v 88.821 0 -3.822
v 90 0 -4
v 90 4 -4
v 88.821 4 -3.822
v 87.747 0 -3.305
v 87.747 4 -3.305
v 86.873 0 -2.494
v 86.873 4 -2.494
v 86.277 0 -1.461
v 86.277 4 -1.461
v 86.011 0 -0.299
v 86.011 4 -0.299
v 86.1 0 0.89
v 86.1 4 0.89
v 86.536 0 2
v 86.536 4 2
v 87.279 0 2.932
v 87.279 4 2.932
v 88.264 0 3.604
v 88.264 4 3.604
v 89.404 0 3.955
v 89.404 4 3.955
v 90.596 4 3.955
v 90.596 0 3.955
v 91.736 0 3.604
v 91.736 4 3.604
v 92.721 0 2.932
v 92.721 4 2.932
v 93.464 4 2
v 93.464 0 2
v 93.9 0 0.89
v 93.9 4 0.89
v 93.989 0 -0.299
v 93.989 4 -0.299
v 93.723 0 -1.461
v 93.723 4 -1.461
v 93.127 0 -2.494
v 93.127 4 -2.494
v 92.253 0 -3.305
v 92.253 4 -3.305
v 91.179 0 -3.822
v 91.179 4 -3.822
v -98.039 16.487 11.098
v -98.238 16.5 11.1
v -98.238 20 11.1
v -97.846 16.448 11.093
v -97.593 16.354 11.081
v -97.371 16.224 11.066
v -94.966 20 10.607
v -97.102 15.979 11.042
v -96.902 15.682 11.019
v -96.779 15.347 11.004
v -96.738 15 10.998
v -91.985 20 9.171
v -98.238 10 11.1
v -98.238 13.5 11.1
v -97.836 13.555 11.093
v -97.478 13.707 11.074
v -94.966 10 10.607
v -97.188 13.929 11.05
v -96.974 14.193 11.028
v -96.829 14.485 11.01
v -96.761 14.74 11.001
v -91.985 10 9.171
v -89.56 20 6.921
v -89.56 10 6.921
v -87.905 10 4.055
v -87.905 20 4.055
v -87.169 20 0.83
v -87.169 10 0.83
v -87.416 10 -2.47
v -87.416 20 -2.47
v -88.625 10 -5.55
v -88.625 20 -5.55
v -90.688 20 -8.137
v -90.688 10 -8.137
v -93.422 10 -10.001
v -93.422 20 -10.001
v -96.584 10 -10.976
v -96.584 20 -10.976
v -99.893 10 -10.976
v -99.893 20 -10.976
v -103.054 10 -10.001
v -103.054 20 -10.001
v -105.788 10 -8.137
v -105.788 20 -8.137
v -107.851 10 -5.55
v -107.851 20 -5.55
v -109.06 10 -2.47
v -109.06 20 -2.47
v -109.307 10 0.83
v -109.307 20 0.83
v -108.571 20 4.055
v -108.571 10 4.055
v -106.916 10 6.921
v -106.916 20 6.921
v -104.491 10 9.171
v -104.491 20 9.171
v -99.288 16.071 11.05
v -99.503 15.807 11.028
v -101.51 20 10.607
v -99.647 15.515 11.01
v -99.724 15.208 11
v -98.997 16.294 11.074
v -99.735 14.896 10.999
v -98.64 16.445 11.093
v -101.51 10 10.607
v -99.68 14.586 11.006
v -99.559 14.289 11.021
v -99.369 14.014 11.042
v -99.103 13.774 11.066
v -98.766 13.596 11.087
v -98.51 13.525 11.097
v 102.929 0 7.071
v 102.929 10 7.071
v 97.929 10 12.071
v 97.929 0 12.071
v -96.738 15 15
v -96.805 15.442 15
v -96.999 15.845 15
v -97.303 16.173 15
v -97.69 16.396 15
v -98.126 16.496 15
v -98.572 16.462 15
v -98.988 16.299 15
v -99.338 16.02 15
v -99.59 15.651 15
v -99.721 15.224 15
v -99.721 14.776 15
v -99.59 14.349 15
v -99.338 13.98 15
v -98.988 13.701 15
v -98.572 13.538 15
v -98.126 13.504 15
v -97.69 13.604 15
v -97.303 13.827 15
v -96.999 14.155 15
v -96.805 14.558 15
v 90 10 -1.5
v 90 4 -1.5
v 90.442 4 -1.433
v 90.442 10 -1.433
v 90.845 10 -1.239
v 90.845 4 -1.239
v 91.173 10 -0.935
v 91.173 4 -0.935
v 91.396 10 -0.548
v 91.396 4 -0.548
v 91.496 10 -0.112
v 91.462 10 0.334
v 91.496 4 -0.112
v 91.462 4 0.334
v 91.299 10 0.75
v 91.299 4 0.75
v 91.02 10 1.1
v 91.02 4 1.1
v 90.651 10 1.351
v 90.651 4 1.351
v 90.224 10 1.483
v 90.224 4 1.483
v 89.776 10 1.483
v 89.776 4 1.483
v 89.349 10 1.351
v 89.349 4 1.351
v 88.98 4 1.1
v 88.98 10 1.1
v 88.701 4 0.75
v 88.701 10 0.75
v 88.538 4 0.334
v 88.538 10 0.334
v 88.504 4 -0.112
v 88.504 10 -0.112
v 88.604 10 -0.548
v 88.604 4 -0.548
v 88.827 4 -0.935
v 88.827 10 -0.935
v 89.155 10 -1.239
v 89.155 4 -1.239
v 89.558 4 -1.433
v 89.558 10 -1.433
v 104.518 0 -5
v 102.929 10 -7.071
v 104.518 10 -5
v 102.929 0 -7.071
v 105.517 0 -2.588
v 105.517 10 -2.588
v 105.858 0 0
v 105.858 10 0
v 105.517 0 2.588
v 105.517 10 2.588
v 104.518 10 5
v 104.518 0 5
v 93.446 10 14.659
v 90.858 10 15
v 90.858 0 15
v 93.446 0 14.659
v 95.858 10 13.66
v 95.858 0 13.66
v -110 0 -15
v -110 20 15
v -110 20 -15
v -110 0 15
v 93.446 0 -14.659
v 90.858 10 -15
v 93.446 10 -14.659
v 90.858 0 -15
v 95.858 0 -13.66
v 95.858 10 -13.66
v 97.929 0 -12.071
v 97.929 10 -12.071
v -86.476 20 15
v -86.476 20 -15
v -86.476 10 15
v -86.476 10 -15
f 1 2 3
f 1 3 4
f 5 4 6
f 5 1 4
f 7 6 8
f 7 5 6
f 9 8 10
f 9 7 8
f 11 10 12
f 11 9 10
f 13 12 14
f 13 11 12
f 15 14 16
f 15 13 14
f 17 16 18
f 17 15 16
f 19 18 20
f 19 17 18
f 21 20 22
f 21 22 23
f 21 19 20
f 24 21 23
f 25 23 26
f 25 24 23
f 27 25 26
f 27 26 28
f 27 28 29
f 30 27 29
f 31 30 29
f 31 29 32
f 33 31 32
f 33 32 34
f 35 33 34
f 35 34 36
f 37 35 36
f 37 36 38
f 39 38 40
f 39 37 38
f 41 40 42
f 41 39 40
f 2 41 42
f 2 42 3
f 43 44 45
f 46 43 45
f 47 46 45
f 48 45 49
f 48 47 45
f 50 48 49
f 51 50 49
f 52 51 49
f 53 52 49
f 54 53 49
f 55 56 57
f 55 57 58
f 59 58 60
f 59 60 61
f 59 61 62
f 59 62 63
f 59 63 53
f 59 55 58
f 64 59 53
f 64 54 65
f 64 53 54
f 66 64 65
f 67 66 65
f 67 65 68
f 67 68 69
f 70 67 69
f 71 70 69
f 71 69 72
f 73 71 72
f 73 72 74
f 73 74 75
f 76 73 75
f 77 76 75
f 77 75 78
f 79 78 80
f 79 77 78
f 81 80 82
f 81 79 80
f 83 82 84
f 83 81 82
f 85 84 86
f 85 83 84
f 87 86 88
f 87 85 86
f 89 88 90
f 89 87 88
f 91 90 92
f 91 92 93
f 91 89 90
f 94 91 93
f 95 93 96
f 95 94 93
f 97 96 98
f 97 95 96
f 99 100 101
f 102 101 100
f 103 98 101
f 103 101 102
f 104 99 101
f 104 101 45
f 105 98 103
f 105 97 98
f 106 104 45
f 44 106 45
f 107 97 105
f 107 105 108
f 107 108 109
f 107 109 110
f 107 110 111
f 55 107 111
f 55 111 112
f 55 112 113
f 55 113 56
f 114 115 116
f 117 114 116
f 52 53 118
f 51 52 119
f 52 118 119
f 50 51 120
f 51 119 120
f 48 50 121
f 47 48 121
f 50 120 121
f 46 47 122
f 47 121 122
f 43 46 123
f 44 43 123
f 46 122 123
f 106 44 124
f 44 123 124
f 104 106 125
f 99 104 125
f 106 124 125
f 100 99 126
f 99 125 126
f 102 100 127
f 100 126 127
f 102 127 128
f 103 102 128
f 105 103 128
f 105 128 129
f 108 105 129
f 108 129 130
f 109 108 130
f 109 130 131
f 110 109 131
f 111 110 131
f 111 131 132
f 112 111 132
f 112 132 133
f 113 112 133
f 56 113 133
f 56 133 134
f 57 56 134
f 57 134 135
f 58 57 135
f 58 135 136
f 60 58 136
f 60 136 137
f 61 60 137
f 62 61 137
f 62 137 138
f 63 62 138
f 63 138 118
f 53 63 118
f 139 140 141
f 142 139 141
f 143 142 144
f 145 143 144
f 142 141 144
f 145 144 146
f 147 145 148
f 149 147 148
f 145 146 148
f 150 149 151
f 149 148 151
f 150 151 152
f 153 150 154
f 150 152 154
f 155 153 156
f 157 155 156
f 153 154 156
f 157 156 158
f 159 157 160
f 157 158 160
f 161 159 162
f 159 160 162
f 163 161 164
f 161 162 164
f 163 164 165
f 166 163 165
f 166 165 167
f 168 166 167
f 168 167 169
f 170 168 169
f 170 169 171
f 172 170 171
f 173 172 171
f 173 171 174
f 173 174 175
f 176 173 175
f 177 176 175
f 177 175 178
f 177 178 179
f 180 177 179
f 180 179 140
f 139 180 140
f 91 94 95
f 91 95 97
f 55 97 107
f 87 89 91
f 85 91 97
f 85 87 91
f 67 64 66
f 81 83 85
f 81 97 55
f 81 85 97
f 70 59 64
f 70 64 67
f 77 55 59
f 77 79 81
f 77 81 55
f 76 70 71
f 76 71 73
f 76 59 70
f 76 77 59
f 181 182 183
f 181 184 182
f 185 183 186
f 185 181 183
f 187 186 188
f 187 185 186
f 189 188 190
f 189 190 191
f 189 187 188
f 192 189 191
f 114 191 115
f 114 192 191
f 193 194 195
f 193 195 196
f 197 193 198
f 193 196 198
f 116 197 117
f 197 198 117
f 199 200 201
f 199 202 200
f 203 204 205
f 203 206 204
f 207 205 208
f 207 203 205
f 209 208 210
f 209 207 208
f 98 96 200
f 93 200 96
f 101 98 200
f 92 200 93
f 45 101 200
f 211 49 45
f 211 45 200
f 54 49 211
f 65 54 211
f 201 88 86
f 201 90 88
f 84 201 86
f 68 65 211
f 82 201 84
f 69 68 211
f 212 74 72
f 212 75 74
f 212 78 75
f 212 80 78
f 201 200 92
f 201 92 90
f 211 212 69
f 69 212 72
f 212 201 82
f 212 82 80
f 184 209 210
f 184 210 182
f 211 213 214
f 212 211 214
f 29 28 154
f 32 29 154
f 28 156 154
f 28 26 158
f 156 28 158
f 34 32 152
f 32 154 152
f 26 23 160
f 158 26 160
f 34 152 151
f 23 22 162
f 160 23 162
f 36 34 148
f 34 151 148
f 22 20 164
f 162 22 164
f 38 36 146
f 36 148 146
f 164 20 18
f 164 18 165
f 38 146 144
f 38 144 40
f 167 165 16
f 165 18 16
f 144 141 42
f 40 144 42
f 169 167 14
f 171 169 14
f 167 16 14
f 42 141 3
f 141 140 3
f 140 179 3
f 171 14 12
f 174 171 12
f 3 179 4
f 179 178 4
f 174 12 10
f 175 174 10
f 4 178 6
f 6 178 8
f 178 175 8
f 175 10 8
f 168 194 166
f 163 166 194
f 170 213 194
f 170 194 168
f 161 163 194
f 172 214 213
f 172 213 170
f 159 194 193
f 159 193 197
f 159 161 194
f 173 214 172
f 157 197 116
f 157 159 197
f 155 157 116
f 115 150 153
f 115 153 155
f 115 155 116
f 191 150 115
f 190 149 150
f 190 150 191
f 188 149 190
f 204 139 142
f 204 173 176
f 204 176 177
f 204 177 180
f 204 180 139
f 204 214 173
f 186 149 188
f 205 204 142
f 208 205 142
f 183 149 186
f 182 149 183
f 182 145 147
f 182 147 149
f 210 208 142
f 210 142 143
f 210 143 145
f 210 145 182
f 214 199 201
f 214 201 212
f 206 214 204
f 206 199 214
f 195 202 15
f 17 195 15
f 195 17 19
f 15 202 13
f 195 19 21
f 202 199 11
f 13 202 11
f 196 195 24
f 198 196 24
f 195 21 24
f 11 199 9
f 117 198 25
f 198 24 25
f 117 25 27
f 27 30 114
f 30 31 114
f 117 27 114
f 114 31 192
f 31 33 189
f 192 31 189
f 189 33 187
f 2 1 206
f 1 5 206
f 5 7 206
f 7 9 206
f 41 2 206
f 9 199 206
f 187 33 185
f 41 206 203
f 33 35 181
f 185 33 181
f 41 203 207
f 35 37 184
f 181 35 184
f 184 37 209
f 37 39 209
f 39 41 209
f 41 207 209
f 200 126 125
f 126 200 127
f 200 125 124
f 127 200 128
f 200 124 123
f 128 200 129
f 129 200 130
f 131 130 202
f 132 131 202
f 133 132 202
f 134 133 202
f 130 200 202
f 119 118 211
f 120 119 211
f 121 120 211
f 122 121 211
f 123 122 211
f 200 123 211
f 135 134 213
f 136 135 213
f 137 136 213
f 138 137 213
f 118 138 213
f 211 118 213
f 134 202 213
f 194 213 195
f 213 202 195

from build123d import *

# Parameters (mm, degrees)
SKETCH1_W           = 220
SKETCH1_H           = 30
BOSS_EXTRUDE1_DEPTH = 10
SKETCH2_W           = 23.523691572
SKETCH2_H           = 30
SKETCH2_R           = 11.1
BOSS_EXTRUDE3_DEPTH = 10
SKETCH6_R           = 1.5
CUT_EXTRUDE2_DEPTH  = 10
CUT_EXTRUDE3_START  = -10
SKETCH4_R           = 4
CUT_EXTRUDE3_DEPTH  = 4
SKETCH7_R           = 1.5
CUT_EXTRUDE4_DEPTH  = 14
CUT_EXTRUDE5_DEPTH  = 10
FILLET1_R           = 10


with BuildPart() as part:
    # Sketch1 → Boss-Extrude1 (new body)
    with BuildSketch(Plane(origin=(0, 0, 0), x_dir=(1, 0, 0), z_dir=(0, 1, 0))):
        Rectangle(SKETCH1_W, SKETCH1_H)
    extrude(amount=BOSS_EXTRUDE1_DEPTH)

    # Sketch2 → Boss-Extrude3 (add)
    with BuildSketch(Plane(origin=(0, 10, 0), x_dir=(1, 0, 0), z_dir=(0, 1, 0))):
        with Locations((-98.238154214, 0)):
            Rectangle(SKETCH2_W, SKETCH2_H)
        with Locations(Location((-98.238154214, 0, 0), (0, 0, 270))):
            Circle(SKETCH2_R, mode=Mode.SUBTRACT)
    extrude(amount=BOSS_EXTRUDE3_DEPTH)

    # Sketch6 → Cut-Extrude2 (cut)
    with BuildSketch(Plane.XY.offset(15)):
        with Locations((-98.238154214, 15)):
            Circle(SKETCH6_R)
    extrude(amount=-CUT_EXTRUDE2_DEPTH, mode=Mode.SUBTRACT)

    # Sketch4 → Cut-Extrude3 (cut)
    with BuildSketch(Plane(origin=(0, 10, 0), x_dir=(1, 0, 0), z_dir=(0, 1, 0)).offset(CUT_EXTRUDE3_START)):
        with Locations(Location((90, 0, 0), (0, 0, 90))):
            Circle(SKETCH4_R)
    extrude(amount=CUT_EXTRUDE3_DEPTH, mode=Mode.SUBTRACT)

    # Sketch7 → Cut-Extrude4 (cut)
    with BuildSketch(Plane(origin=(0, 4, 0), x_dir=(-1, 0, 0), z_dir=(0, -1, 0))):
        with Locations(Location((-90, 0, 0), (0, 0, 90))):
            Circle(SKETCH7_R)
    extrude(amount=-CUT_EXTRUDE4_DEPTH, mode=Mode.SUBTRACT)

    # Sketch8 → Cut-Extrude5 (cut)
    with BuildSketch(Plane(origin=(0, 10, 0), x_dir=(1, 0, 0), z_dir=(0, 1, 0))):
        Polygon((110, -15), (110, 0), (95, -15), align=None)
        Polygon((110, 15), (95, 15), (110, 0), align=None)
    extrude(amount=-CUT_EXTRUDE5_DEPTH, mode=Mode.SUBTRACT)

    # Fillet1
    fillet1_edges = [part.edges().sort_by_distance(p)[0] for p in [
        (110, 5, 0),
        (95, 5, 15),
        (95, 5, -15),
    ]]
    fillet(fillet1_edges, radius=FILLET1_R)


solid = part.part
